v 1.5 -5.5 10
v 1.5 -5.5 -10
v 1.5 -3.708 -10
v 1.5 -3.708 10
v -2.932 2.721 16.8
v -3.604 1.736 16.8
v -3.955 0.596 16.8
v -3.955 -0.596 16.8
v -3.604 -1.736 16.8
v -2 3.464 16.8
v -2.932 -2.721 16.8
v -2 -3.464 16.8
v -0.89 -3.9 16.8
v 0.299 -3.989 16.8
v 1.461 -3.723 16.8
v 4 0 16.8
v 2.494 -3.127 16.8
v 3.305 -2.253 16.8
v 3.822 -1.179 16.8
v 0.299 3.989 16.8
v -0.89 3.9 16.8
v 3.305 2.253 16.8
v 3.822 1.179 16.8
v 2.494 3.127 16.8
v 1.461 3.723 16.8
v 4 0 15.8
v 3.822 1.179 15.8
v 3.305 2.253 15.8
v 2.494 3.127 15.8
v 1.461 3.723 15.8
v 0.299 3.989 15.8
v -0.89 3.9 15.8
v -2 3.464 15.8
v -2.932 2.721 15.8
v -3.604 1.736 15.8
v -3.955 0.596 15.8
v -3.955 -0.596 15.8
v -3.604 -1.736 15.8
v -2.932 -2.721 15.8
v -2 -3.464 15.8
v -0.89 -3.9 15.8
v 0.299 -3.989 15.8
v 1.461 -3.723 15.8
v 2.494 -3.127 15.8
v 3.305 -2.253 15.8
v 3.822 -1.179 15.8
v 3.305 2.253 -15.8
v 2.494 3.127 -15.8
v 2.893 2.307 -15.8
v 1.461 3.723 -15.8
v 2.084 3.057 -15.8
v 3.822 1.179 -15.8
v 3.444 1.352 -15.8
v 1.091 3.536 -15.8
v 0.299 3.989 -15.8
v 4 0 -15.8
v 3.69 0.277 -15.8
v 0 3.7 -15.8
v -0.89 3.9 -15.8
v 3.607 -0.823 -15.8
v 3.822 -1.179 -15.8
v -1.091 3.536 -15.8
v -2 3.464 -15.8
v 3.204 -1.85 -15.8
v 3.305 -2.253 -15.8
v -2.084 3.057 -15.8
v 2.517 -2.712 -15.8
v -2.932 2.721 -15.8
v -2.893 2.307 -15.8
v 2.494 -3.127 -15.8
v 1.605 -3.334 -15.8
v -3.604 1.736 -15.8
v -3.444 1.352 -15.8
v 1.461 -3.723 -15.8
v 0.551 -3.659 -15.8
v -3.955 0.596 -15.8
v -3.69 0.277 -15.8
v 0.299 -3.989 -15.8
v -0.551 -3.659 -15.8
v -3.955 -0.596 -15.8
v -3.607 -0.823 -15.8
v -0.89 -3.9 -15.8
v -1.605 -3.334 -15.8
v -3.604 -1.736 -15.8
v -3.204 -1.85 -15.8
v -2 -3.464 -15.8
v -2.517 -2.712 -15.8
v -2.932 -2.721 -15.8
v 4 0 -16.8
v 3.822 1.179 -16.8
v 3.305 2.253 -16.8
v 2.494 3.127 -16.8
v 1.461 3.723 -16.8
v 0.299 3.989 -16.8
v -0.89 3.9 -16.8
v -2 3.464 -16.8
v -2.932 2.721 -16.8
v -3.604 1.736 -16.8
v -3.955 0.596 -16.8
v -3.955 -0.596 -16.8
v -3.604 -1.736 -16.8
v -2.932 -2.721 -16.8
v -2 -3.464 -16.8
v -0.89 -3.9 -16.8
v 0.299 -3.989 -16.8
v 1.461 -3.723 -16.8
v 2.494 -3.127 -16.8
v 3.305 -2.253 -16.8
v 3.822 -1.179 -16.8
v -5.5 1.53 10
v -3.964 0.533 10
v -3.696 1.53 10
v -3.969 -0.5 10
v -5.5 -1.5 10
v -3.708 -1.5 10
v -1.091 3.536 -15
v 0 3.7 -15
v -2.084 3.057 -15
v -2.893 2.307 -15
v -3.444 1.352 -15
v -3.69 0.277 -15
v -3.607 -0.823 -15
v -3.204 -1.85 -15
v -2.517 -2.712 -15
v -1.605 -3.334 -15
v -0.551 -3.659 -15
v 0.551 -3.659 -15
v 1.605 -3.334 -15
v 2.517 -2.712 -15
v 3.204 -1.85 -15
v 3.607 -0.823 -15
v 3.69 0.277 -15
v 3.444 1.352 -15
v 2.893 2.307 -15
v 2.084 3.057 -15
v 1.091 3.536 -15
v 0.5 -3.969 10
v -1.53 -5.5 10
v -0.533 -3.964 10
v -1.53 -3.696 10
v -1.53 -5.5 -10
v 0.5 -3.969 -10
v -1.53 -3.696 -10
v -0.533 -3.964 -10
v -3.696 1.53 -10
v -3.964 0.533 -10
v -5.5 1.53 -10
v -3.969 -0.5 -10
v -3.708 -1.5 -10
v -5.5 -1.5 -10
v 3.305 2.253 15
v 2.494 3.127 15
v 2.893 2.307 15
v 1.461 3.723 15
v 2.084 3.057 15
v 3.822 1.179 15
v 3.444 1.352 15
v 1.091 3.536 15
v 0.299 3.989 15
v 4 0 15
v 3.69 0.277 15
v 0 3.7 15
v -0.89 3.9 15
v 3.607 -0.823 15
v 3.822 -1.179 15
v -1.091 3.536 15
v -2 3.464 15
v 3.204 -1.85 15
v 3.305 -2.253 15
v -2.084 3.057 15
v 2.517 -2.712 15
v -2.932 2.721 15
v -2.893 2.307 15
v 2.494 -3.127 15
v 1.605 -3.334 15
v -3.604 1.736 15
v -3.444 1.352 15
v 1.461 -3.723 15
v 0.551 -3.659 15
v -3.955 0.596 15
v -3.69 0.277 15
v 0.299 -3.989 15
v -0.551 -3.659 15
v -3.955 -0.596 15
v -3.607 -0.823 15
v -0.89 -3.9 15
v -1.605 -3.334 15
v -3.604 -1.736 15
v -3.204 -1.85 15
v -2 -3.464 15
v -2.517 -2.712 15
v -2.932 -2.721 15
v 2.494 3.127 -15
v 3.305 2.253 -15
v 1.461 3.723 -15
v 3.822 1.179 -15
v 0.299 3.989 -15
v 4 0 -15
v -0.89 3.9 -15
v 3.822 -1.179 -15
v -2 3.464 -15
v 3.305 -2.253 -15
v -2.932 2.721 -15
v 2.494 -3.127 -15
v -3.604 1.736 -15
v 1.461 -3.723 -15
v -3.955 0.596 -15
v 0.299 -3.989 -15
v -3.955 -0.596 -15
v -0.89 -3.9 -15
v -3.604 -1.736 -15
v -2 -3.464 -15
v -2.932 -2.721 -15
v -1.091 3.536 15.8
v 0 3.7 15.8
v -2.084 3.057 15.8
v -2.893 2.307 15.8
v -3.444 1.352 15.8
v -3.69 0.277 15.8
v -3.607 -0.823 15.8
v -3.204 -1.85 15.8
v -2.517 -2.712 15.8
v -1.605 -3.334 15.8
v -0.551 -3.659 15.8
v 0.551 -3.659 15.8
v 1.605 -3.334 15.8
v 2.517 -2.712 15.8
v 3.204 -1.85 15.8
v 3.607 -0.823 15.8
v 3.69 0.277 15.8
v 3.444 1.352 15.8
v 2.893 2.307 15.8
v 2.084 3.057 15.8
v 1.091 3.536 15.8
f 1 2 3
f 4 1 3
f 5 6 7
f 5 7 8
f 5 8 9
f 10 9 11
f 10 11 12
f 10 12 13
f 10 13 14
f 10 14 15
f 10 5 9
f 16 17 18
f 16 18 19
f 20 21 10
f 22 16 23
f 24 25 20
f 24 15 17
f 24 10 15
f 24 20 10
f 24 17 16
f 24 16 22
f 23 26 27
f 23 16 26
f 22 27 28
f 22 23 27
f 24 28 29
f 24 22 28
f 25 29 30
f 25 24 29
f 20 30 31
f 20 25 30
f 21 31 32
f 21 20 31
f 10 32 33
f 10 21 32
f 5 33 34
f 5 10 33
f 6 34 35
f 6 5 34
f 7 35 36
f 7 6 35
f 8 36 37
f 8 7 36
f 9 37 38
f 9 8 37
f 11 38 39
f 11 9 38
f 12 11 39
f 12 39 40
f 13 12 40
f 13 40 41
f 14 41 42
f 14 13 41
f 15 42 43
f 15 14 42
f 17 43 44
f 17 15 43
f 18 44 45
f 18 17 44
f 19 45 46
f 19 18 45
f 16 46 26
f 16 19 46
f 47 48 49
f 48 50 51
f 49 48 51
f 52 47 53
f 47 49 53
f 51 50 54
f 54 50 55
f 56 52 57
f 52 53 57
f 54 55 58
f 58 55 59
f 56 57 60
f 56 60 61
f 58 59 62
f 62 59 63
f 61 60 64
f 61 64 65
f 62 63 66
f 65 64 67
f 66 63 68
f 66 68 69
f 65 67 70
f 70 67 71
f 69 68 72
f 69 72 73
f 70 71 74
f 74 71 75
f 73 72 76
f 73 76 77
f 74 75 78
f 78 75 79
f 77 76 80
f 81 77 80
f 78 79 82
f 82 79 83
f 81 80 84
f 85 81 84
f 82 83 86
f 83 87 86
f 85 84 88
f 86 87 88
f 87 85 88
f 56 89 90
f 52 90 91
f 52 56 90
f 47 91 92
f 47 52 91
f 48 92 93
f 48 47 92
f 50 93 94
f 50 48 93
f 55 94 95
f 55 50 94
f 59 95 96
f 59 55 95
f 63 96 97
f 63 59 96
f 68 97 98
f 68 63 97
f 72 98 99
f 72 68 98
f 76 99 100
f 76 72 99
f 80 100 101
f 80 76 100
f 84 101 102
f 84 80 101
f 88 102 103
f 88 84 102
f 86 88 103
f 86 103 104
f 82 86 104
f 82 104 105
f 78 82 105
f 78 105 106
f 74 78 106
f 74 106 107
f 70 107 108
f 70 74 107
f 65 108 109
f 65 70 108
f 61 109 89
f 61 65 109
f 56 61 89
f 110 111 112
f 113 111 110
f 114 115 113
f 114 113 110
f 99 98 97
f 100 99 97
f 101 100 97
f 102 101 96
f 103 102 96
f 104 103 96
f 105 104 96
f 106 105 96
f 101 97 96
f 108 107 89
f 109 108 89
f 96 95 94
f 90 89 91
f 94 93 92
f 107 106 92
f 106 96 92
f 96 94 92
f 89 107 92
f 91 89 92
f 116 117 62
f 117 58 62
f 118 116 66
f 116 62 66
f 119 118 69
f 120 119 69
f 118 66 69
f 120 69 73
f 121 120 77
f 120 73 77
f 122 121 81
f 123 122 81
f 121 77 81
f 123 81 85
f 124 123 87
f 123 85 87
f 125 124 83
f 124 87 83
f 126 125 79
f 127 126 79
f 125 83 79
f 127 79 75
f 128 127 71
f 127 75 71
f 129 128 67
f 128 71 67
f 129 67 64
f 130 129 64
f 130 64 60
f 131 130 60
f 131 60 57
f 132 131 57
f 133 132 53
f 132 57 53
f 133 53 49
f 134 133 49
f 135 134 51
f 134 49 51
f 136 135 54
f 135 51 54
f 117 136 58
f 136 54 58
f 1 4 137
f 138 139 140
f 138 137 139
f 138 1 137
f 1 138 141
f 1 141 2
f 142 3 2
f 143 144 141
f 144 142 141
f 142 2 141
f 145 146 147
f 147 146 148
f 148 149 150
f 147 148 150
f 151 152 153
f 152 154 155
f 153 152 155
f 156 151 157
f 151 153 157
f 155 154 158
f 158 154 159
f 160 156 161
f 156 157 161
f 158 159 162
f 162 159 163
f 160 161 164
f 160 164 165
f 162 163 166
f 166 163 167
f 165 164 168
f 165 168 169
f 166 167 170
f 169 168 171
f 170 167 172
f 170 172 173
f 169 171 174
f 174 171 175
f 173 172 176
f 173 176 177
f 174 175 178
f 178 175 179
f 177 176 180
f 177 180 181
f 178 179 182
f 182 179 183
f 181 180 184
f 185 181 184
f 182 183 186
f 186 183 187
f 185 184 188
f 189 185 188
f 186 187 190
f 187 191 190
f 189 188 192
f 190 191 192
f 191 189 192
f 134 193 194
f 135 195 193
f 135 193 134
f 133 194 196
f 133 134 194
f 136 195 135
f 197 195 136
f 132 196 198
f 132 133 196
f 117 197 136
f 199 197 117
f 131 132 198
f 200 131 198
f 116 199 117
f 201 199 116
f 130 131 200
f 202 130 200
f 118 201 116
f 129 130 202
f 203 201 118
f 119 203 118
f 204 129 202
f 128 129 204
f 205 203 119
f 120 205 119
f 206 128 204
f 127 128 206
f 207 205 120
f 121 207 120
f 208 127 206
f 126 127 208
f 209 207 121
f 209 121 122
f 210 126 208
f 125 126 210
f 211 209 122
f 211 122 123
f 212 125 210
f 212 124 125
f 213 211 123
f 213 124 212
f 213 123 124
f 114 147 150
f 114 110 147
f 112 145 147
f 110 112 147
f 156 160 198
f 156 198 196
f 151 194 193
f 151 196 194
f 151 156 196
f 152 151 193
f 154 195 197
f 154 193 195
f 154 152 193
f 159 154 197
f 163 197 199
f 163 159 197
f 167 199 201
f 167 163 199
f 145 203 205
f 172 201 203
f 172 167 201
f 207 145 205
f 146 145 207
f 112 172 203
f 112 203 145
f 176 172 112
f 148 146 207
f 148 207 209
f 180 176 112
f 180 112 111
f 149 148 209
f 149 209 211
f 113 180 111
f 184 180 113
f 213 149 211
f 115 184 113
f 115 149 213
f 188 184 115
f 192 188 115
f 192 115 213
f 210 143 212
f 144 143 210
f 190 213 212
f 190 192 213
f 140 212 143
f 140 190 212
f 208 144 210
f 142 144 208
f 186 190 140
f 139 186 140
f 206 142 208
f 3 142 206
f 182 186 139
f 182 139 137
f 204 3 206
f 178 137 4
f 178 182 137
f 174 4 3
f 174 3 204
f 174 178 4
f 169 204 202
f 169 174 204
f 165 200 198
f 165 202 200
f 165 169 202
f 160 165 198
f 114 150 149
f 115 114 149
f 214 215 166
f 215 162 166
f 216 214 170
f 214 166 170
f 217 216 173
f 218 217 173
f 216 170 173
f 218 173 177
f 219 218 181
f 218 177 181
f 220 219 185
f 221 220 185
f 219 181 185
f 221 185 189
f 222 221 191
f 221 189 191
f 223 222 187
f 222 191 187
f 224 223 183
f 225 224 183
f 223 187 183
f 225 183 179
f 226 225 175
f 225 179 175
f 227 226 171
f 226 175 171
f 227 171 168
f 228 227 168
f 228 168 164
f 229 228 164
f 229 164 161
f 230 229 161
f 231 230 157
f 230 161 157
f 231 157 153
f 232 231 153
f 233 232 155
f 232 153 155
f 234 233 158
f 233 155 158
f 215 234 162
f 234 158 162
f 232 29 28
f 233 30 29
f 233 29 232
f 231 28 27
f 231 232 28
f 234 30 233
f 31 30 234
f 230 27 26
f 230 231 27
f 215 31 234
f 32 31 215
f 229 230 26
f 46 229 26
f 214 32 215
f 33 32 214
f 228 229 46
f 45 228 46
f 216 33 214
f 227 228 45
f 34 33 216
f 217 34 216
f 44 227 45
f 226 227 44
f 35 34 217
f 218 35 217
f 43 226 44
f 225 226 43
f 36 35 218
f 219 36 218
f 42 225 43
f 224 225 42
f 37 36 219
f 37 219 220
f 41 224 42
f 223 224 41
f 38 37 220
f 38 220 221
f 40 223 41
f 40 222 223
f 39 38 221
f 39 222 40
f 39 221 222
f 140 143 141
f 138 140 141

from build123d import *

# Parameters (mm, degrees)
SKETCH_1_R      = 4
EXTRUDE_1_DEPTH = 16.8
SKETCH_2_W      = 0.8
SKETCH_2_H      = 0.3
EXTRUDE_2_DEPTH = 10


with BuildPart() as part:
    # 草图1 → 凸台-拉伸1 (new body, symmetric)
    with BuildSketch(Plane.XY):
        Circle(SKETCH_1_R)
    extrude(amount=EXTRUDE_1_DEPTH, both=True)

    # 草图2 → 切除-旋转1 (revolve, cut)
    with BuildSketch(Plane(origin=(0, 0, 0), x_dir=(0, 0, -1), z_dir=(1, 0, 0))):
        with Locations((-15.4, 3.85)):
            Rectangle(SKETCH_2_W, SKETCH_2_H)
        with Locations((15.4, 3.85)):
            Rectangle(SKETCH_2_W, SKETCH_2_H)
    revolve(axis=Axis((0, 0, -18.8), (0, 0, 1)), mode=Mode.SUBTRACT)

    # 草图3 → 凸台-拉伸2 (add, symmetric)
    with BuildSketch(Plane(origin=(0, 0, 0), x_dir=(-1, 0, 0), z_dir=(0, 0, 1))):
        with BuildLine():
            Line((5.5, 1.5), (3.708099, 1.5))
            ThreePointArc((3.708099, 1.5), (2.839864, 2.816943), (1.53, 3.695822))
            Line((1.53, 3.695822), (1.53, 5.5))
            Line((1.53, 5.5), (-1.5, 5.5))
            Line((-1.5, 5.5), (-1.5, 3.708099))
            ThreePointArc((-1.5, 3.708099), (-2.839864, -2.816943), (3.695822, -1.53))
            Line((3.695822, -1.53), (5.5, -1.53))
            Line((5.5, -1.53), (5.5, 1.5))
        make_face()
    extrude(amount=EXTRUDE_2_DEPTH, both=True)


solid = part.part
